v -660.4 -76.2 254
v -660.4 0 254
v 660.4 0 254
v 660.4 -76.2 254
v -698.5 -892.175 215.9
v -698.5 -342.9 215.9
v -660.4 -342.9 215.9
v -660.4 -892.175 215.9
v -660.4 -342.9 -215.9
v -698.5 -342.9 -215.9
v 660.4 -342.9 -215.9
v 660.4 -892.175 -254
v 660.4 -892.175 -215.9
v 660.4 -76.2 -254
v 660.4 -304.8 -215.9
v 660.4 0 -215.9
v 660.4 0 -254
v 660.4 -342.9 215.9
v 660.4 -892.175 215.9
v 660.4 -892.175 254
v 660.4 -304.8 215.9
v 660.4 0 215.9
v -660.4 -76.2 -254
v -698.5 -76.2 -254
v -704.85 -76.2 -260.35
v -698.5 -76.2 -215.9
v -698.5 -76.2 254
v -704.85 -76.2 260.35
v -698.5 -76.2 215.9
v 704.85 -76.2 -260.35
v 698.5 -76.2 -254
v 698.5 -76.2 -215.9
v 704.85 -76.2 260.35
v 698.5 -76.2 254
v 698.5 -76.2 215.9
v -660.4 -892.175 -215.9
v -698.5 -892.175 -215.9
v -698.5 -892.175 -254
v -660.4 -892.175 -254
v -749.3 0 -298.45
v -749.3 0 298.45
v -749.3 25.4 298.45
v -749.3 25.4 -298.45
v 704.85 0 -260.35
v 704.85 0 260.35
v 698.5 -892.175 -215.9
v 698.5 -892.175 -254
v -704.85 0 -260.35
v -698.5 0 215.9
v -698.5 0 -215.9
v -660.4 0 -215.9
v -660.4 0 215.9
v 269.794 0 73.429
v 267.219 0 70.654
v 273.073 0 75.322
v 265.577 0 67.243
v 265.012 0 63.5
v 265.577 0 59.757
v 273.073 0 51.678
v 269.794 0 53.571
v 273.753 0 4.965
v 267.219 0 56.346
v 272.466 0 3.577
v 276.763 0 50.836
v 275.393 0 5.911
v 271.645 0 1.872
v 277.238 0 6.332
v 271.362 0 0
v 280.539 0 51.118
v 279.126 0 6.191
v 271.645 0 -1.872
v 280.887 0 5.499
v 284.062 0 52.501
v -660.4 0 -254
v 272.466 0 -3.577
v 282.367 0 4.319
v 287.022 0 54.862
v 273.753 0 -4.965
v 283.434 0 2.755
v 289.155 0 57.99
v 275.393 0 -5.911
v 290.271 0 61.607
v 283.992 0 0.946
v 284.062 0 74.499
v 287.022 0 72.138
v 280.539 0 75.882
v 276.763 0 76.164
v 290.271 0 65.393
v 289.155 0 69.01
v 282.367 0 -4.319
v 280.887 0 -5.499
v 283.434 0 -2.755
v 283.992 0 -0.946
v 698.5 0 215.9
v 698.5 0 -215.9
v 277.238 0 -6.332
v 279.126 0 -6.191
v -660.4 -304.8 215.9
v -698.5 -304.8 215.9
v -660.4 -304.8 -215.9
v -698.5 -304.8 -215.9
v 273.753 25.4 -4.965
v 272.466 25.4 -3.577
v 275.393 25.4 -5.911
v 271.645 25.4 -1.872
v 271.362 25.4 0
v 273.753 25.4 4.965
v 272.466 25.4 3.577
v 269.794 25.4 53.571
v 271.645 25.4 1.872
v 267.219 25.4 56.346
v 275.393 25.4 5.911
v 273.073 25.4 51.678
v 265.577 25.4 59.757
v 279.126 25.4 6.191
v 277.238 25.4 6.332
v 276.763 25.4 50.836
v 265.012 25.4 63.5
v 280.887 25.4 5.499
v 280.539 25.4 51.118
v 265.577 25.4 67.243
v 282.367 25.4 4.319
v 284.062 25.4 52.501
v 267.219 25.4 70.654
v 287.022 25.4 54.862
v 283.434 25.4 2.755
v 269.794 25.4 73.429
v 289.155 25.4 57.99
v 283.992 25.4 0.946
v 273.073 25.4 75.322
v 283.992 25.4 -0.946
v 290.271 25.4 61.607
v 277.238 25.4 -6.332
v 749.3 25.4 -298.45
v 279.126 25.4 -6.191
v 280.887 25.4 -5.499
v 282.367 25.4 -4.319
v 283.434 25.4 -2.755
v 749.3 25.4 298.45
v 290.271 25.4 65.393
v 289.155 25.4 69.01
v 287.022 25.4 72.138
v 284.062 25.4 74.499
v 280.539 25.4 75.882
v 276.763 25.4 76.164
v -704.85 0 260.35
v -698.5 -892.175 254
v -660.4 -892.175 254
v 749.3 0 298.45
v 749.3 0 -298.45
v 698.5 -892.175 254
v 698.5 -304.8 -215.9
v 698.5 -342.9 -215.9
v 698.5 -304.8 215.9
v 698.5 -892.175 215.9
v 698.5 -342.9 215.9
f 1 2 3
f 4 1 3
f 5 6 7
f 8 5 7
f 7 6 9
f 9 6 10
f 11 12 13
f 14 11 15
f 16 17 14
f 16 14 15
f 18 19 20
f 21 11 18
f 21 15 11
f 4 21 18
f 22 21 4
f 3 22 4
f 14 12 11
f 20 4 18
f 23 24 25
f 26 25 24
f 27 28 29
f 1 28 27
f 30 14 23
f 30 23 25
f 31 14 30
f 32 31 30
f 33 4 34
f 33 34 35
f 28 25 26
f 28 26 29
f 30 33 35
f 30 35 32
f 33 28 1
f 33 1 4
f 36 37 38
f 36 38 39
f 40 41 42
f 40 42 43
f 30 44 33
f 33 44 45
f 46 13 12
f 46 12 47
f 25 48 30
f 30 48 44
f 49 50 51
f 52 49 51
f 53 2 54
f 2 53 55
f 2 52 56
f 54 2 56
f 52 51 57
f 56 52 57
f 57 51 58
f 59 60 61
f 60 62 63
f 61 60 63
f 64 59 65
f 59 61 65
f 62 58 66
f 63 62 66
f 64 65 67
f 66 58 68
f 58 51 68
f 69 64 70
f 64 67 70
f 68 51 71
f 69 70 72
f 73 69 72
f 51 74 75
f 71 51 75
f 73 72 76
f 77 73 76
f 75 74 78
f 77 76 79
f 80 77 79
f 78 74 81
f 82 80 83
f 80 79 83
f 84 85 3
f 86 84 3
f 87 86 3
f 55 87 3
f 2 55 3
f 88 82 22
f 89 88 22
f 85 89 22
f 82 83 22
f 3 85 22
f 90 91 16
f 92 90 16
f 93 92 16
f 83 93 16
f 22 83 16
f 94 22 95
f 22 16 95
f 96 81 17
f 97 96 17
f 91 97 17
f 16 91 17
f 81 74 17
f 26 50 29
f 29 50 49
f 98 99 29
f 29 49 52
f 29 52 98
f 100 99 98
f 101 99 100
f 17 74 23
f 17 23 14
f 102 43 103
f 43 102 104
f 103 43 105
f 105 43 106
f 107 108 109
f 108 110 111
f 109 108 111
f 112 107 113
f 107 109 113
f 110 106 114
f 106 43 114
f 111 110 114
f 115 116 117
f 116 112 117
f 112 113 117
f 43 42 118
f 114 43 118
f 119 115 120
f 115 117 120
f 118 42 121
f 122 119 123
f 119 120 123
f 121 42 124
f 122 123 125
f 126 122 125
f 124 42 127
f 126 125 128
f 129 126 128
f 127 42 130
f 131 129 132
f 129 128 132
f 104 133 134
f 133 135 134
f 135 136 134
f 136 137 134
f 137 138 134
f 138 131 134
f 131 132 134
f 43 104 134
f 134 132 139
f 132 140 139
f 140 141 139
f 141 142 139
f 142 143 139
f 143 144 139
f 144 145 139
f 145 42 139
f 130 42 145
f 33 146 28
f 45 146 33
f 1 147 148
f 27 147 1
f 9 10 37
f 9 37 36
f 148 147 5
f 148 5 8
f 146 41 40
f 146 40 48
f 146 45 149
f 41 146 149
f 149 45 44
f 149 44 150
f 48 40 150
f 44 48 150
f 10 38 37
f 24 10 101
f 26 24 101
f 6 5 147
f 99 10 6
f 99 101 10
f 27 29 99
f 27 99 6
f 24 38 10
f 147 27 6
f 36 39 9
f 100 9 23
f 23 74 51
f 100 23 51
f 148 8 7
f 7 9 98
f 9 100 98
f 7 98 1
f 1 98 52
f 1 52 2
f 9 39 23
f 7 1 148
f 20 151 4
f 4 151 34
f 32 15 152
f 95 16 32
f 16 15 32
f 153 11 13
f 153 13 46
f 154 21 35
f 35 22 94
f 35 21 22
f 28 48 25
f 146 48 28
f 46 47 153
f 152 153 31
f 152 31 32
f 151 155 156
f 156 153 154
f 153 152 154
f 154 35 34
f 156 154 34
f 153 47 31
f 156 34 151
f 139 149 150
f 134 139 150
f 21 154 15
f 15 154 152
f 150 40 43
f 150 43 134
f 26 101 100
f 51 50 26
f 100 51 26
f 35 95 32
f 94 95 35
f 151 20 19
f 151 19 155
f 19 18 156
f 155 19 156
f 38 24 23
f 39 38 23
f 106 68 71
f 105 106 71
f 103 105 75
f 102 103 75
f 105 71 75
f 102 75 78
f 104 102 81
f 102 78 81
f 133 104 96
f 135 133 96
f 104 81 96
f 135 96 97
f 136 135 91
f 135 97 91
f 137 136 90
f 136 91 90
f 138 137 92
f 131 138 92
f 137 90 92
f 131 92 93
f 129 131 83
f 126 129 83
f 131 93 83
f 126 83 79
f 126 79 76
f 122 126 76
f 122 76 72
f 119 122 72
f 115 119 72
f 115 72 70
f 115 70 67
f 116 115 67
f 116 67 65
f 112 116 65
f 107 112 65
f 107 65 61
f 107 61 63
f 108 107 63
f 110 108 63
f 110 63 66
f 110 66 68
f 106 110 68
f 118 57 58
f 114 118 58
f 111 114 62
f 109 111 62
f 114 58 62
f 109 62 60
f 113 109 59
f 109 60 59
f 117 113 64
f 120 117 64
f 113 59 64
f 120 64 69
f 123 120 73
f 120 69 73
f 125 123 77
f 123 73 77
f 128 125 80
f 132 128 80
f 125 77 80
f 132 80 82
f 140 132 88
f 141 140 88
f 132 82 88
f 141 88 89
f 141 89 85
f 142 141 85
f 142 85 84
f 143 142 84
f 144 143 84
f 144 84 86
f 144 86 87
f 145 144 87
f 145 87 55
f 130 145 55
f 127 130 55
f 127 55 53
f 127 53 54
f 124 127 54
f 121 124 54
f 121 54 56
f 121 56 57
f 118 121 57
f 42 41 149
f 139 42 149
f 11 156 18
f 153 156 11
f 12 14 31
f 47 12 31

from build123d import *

# Parameters (mm, degrees)
SKETCH1_W                  = 1498.6
SKETCH1_H                  = 596.9
BOSS_EXTRUDE1_DEPTH        = 25.4
SKETCH3_W                  = 38.1
SKETCH3_H                  = 38.1
BOSS_EXTRUDE2_DEPTH        = 917.575
SKETCH4_W                  = 508
SKETCH4_H                  = 38.1
BOSS_EXTRUDE3_DEPTH        = 38.1
F_1_2_0_5_DIAMETER_HOLE1_D = 12.7
SKETCH9_W                  = 1409.7
SKETCH9_H                  = 520.7
SKETCH9_W_2                = 1397
SKETCH9_H_2                = 508
BOSS_EXTRUDE4_DEPTH        = 76.2
F_1_1_DIAMETER_HOLE3_D     = 25.4


with BuildPart() as part:
    # Sketch1 → Boss-Extrude1 (new body)
    with BuildSketch(Plane(origin=(0, 0, 0), x_dir=(1, 0, 0), z_dir=(0, 1, 0))):
        Rectangle(SKETCH1_W, SKETCH1_H)
    extrude(amount=BOSS_EXTRUDE1_DEPTH)

    # Sketch3 → Boss-Extrude2 (add)
    with BuildSketch(Plane.XZ.offset(-25.4)):
        with Locations((-679.45, 234.95)):
            Rectangle(SKETCH3_W, SKETCH3_H)
        with Locations((679.45, 234.95)):
            Rectangle(SKETCH3_W, SKETCH3_H)
        with Locations((679.45, -234.95)):
            Rectangle(SKETCH3_W, SKETCH3_H)
        with Locations((-679.45, -234.95)):
            Rectangle(SKETCH3_W, SKETCH3_H)
    extrude(amount=BOSS_EXTRUDE2_DEPTH)

    # Sketch4 → Boss-Extrude3 (add)
    with BuildSketch(Plane(origin=(698.5, 0, 0), x_dir=(0, 0, -1), z_dir=(1, 0, 0))):
        with Locations((0, -323.85)):
            Rectangle(SKETCH4_W, SKETCH4_H)
    boss_extrude3 = extrude(amount=-BOSS_EXTRUDE3_DEPTH)

    # Mirror1: Boss-Extrude3 across plane
    add(boss_extrude3.mirror(Plane(origin=(0, 0, 0), x_dir=(0, 0, 1), z_dir=(1, 0, 0))))

    # 1/2 (0.5) Diameter Hole1 (through all)
    with Locations(Plane(origin=(0, 25.4, 0), x_dir=(1, 0, 0), z_dir=(0, 1, 0))):
        with Locations((277.712499946, 0)):
            Hole(F_1_2_0_5_DIAMETER_HOLE1_D / 2)

    # Sketch9 → Boss-Extrude4 (add)
    with BuildSketch(Plane.XZ):
        Rectangle(SKETCH9_W, SKETCH9_H)
        Rectangle(SKETCH9_W_2, SKETCH9_H_2, mode=Mode.SUBTRACT)
    extrude(amount=BOSS_EXTRUDE4_DEPTH)

    # 1 (1) Diameter Hole3 (through all)
    with Locations(Plane(origin=(0, 25.4, 0), x_dir=(1, 0, 0), z_dir=(0, 1, 0))):
        with Locations((277.712499946, -63.5)):
            Hole(F_1_1_DIAMETER_HOLE3_D / 2)


solid = part.part
